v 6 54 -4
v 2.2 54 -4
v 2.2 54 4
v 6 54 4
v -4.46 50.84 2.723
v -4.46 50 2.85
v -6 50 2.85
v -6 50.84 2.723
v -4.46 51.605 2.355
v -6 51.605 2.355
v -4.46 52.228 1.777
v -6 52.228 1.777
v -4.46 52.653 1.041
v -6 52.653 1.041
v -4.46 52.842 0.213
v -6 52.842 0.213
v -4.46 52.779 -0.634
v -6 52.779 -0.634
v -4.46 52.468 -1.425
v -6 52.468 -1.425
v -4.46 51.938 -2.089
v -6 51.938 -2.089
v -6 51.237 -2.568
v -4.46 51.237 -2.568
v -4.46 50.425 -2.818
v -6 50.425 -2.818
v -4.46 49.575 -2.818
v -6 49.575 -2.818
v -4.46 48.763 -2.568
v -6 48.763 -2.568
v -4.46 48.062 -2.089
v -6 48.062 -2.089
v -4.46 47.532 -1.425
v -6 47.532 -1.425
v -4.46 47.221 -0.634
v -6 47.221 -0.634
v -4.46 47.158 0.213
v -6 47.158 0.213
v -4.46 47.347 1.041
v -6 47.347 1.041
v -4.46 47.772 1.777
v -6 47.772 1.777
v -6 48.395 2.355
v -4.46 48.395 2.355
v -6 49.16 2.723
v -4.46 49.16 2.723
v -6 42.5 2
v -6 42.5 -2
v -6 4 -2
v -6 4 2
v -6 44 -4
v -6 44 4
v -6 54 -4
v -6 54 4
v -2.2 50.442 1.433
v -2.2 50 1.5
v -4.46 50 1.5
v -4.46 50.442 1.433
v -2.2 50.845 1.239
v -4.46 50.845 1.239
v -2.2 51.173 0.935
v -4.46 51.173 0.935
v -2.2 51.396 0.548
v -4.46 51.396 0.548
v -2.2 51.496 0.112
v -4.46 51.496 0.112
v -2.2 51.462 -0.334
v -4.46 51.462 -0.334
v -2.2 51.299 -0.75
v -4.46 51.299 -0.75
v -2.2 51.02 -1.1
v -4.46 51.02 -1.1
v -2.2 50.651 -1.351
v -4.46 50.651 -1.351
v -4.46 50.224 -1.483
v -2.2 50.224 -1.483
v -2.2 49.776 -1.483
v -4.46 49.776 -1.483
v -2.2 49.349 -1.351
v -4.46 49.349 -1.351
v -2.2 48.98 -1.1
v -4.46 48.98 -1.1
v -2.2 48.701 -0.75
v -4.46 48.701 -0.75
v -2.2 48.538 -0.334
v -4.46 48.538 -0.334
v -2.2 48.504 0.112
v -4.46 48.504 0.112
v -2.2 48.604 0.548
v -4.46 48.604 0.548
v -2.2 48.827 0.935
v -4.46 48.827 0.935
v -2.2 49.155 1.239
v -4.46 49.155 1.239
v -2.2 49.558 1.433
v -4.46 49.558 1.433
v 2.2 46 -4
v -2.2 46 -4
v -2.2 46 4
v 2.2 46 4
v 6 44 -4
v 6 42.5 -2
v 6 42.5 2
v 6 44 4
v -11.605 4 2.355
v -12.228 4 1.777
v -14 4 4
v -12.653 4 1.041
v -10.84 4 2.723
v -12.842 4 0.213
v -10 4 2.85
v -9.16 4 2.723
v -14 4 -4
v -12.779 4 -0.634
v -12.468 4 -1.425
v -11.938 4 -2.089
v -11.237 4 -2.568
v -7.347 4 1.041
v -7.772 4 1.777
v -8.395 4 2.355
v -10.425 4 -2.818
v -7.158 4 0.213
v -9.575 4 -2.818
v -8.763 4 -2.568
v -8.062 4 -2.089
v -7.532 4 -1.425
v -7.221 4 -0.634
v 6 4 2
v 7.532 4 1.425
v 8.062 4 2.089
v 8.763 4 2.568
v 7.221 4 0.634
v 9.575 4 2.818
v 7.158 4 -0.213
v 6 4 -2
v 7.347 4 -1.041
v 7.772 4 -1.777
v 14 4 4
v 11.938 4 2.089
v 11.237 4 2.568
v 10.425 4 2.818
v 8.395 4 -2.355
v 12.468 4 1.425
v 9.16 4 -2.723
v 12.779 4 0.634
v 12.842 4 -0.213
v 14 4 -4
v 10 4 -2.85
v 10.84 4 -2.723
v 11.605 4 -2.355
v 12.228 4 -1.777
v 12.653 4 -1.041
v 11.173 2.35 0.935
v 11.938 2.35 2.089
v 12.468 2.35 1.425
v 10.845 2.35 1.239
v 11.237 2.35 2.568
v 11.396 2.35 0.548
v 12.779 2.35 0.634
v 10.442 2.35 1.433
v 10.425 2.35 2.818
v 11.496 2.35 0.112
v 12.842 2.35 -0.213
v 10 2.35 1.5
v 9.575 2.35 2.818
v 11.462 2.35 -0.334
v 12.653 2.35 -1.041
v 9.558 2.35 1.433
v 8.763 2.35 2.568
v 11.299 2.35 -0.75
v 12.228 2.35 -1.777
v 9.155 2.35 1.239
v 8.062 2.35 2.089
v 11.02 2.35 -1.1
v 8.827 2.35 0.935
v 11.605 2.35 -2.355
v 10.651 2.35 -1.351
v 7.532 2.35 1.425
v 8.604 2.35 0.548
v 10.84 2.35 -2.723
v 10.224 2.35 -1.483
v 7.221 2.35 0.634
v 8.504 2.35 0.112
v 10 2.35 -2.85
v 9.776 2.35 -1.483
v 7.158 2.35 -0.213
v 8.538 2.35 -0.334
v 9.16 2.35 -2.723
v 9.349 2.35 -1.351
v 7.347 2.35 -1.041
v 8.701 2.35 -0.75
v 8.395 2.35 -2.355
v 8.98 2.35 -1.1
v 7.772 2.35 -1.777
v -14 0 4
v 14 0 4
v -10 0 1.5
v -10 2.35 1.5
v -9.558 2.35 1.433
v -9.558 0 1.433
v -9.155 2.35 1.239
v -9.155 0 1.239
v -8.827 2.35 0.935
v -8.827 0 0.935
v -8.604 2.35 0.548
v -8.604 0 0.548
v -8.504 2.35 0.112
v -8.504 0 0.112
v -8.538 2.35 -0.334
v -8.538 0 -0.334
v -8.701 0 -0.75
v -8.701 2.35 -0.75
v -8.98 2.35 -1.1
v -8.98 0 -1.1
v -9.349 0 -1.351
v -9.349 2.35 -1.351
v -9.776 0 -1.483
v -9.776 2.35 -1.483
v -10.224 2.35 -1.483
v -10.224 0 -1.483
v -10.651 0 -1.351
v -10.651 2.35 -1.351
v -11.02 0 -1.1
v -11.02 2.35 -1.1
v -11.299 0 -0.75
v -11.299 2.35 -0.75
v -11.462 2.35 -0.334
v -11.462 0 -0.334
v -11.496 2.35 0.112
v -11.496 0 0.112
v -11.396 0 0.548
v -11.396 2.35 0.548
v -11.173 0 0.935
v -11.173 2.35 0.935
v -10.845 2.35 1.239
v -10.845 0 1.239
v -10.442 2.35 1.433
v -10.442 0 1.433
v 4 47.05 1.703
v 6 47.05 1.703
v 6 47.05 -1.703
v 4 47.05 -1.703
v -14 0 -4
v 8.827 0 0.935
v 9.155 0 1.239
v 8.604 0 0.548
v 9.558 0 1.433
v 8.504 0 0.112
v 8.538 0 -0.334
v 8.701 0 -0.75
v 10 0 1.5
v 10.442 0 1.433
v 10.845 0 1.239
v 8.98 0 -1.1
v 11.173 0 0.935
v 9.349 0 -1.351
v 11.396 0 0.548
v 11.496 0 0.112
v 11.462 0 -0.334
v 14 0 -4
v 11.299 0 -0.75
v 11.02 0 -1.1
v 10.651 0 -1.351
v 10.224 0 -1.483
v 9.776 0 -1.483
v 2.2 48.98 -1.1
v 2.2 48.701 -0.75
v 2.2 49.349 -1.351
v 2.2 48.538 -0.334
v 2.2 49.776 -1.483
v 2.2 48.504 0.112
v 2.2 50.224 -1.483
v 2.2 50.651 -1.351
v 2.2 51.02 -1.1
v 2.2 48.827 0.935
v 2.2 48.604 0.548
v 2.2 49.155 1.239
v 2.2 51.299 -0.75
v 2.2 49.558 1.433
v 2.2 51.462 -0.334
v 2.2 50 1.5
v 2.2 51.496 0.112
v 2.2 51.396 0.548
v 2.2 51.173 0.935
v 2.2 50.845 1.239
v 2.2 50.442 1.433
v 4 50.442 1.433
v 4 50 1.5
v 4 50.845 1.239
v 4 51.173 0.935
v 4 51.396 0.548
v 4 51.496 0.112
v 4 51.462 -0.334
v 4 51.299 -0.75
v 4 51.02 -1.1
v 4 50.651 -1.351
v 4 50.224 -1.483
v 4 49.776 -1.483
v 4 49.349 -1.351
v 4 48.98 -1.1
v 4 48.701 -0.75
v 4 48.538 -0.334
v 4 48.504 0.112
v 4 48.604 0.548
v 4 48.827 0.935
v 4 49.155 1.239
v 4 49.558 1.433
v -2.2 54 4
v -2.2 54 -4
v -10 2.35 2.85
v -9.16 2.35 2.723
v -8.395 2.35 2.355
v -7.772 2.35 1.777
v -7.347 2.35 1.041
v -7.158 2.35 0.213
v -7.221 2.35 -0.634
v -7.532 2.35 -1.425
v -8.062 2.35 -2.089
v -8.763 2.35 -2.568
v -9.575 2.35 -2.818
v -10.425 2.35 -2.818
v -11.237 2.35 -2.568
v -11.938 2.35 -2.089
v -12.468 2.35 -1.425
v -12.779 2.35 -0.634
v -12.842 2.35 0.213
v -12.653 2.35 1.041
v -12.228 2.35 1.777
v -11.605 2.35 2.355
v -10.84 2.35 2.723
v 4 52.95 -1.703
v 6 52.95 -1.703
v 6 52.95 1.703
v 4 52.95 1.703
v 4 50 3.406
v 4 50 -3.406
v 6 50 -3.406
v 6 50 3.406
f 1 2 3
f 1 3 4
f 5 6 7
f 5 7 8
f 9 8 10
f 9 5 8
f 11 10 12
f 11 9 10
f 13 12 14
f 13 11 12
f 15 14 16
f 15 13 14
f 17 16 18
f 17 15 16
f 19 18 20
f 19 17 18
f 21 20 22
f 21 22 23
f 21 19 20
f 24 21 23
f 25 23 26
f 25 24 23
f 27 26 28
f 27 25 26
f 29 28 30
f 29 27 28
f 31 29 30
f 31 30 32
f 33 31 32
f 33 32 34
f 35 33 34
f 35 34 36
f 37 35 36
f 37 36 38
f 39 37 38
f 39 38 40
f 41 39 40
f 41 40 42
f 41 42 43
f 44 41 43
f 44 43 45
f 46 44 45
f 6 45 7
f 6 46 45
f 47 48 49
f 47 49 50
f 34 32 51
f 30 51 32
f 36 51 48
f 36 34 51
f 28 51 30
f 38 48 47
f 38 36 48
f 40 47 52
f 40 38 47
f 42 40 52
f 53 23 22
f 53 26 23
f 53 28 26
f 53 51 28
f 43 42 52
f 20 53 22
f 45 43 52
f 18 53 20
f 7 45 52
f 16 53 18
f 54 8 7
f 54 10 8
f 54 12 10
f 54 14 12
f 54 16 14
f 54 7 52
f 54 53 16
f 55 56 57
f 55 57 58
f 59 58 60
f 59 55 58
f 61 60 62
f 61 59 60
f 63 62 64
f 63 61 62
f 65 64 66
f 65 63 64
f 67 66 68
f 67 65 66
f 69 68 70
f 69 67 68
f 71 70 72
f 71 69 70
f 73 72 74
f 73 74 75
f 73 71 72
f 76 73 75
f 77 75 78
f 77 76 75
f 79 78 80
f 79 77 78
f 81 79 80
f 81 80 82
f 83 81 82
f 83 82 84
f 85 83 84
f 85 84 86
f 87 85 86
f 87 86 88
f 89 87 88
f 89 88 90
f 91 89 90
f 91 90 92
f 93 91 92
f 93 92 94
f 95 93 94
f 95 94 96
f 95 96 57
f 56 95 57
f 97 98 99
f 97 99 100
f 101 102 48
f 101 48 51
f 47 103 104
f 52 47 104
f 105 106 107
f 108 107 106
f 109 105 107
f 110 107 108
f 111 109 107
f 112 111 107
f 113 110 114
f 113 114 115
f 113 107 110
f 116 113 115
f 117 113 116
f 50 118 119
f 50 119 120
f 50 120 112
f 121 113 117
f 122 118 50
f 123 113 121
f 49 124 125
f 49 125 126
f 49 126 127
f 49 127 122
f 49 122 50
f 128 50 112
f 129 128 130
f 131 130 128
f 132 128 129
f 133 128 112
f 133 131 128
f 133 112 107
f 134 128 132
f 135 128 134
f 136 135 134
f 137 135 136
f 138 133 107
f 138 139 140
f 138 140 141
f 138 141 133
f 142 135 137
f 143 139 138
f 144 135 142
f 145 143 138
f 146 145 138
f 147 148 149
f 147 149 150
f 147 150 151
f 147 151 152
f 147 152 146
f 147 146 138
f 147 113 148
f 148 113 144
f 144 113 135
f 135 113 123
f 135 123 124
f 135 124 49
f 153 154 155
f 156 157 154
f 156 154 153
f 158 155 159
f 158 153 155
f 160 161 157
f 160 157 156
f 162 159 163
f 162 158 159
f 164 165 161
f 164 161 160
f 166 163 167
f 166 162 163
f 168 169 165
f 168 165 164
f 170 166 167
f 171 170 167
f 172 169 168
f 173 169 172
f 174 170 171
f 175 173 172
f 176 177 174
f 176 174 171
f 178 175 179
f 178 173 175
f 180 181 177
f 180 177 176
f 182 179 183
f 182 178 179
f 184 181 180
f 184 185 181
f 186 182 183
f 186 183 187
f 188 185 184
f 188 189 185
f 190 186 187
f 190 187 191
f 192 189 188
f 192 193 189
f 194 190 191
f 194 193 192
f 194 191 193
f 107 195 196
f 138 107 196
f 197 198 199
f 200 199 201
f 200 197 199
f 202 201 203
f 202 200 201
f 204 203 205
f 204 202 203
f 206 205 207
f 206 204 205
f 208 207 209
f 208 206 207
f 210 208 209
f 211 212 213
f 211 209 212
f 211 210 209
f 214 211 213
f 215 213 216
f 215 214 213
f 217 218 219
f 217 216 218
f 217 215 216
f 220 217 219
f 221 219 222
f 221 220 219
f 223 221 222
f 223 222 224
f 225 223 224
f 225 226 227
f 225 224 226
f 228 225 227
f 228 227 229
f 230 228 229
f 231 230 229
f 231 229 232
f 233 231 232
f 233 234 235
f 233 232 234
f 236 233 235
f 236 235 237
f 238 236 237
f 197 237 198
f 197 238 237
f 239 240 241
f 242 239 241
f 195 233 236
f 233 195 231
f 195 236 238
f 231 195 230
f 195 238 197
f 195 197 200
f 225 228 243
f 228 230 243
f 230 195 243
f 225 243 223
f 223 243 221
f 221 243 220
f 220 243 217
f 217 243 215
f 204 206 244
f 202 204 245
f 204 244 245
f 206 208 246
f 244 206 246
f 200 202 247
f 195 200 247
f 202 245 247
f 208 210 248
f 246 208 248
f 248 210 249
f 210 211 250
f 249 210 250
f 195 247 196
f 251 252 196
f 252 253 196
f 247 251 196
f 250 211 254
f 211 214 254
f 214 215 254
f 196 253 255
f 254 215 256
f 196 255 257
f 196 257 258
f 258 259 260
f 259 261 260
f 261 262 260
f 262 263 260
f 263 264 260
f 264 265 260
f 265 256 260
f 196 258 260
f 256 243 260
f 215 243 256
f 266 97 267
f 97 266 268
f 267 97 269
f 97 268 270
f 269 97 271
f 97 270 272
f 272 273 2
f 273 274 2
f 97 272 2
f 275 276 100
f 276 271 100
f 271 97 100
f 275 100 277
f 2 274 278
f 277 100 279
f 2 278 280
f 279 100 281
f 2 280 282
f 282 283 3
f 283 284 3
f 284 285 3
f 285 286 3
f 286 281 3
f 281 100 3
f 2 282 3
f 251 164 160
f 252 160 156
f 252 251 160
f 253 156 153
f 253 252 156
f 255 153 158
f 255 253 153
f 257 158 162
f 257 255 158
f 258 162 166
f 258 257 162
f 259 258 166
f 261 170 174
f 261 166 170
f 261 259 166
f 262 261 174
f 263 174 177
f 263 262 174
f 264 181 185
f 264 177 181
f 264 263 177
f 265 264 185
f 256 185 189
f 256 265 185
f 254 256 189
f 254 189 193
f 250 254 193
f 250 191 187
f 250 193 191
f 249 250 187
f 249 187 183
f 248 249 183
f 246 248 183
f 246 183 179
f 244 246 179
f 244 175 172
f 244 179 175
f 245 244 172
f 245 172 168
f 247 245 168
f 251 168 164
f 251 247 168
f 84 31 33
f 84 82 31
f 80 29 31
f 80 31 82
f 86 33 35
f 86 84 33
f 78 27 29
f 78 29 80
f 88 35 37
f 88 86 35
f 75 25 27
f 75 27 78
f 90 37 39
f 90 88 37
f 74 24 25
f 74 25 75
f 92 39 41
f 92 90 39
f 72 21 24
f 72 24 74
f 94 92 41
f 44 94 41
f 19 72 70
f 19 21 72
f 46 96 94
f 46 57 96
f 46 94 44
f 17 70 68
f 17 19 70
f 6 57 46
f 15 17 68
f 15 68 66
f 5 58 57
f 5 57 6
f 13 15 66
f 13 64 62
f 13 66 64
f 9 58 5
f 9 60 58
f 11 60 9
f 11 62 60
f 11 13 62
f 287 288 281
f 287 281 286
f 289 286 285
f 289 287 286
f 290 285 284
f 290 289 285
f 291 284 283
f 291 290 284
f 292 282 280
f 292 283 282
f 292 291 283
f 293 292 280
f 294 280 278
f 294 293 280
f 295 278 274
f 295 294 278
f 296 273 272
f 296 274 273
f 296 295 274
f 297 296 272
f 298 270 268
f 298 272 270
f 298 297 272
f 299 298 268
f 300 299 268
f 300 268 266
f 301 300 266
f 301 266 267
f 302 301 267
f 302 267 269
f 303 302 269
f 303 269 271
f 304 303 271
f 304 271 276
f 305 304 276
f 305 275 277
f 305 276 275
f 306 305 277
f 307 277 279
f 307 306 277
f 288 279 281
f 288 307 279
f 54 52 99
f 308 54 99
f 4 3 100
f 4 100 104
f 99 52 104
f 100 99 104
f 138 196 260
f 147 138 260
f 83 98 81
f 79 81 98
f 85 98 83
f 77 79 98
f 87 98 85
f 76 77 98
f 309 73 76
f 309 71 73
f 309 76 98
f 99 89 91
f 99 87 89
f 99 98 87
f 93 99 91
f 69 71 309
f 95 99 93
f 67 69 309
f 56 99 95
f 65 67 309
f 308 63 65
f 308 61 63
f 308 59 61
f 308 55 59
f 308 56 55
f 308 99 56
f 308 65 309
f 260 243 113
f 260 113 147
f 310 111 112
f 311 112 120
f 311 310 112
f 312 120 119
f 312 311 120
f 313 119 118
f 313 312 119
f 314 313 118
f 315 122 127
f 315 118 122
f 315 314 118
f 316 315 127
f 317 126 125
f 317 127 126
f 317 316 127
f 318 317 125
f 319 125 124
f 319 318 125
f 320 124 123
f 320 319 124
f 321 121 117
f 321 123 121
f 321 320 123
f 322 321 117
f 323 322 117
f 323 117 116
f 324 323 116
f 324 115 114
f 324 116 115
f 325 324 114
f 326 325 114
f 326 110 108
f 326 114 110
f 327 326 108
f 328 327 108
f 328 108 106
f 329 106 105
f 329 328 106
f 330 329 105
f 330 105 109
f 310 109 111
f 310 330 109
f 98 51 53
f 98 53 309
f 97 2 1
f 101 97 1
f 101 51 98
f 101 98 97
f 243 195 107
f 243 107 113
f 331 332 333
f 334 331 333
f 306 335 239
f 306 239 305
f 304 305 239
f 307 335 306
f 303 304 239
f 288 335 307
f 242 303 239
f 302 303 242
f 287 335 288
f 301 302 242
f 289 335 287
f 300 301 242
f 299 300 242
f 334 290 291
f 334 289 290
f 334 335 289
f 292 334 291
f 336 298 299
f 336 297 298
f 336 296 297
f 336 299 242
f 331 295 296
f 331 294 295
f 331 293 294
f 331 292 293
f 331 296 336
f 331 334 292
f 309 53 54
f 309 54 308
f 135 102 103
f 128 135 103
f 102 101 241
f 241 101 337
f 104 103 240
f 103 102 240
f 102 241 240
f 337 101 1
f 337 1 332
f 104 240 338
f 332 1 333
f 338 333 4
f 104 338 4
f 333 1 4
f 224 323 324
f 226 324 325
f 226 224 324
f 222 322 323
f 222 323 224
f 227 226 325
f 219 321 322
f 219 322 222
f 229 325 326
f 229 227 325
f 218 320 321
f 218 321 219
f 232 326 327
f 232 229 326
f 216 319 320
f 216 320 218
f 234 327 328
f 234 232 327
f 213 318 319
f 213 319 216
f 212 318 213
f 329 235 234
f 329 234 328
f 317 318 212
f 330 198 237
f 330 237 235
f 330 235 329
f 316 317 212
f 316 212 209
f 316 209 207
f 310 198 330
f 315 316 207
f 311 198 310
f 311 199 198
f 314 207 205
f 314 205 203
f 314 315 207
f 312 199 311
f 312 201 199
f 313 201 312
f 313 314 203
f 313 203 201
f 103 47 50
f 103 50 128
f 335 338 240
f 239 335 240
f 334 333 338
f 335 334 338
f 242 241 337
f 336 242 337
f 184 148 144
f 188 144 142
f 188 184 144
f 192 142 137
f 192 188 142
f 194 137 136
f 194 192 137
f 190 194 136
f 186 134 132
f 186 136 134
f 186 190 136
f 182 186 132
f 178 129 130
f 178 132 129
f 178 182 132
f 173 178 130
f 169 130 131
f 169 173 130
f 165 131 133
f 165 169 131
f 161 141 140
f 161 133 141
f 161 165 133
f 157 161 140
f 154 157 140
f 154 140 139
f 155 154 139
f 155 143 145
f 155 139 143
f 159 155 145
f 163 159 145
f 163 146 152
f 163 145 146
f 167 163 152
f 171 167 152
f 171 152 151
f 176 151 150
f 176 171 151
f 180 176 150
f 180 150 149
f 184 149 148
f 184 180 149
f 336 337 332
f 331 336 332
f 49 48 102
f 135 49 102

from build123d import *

# Parameters (mm, degrees)
CROQUIS1_W              = 28
CROQUIS1_H              = 8
CROQUIS1_R              = 2.85
CROQUIS1_R_2            = 1.5
SALIENTE_EXTRUIR1_DEPTH = 4
CORTAR_EXTRUIR1_START   = 2.35
CROQUIS1_3_R            = 2.85
CORTAR_EXTRUIR1_DEPTH   = 13.749668871
CROQUIS2_W              = 12
CROQUIS2_H              = 4
SALIENTE_EXTRUIR2_DEPTH = 40
CROQUIS3_W              = 12
CROQUIS3_H              = 8
SALIENTE_EXTRUIR3_DEPTH = 10
CROQUIS4_W              = 4.4
CROQUIS4_H              = 8
CORTAR_EXTRUIR2_DEPTH   = 57.356011214
CORTAR_EXTRUIR7_START   = -12
CROQUIS5_R              = 1.5
CORTAR_EXTRUIR7_DEPTH   = 12
CORTAR_EXTRUIR8_START   = -1.54
CROQUIS5_4_R            = 2.85
CROQUIS5_4_R_2          = 1.5
CORTAR_EXTRUIR8_DEPTH   = 1.54
CORTAR_EXTRUIR9_DEPTH   = 2
SALIENTE_EXTRUIR4_DEPTH = 12


with BuildPart() as part:
    # Croquis1 → Saliente-Extruir1 (new body)
    # profile 1 of 3: a face of its own
    with BuildSketch(Plane(origin=(0, 0, 0), x_dir=(1, 0, 0), z_dir=(0, 1, 0))):
        Rectangle(CROQUIS1_W, CROQUIS1_H)
        with Locations((-10, 0)):
            Circle(CROQUIS1_R, mode=Mode.SUBTRACT)
        with Locations((10, 0)):
            Circle(CROQUIS1_R, mode=Mode.SUBTRACT)
    # profile 2 of 3: a face of its own
    with BuildSketch(Plane(origin=(0, 0, 0), x_dir=(1, 0, 0), z_dir=(0, 1, 0))):
        with Locations((-10, 0)):
            Circle(CROQUIS1_R)
        with Locations(Location((-10, 0, 0), (0, 0, 270))):
            Circle(CROQUIS1_R_2, mode=Mode.SUBTRACT)
    # profile 3 of 3: a face of its own
    with BuildSketch(Plane(origin=(0, 0, 0), x_dir=(1, 0, 0), z_dir=(0, 1, 0))):
        with Locations((10, 0)):
            Circle(CROQUIS1_R)
        with Locations(Location((10, 0, 0), (0, 0, 270))):
            Circle(CROQUIS1_R_2, mode=Mode.SUBTRACT)
    extrude(amount=SALIENTE_EXTRUIR1_DEPTH)

    # Croquis1<3> → Cortar-Extruir1 (cut, through all)
    with BuildSketch(Plane(origin=(0, 0, 0), x_dir=(1, 0, 0), z_dir=(0, 1, 0)).offset(CORTAR_EXTRUIR1_START)):
        with Locations(Location((-10, 0, 0), (0, 0, 270))):
            Circle(CROQUIS1_3_R)
        with Locations(Location((10, 0, 0), (0, 0, 90))):
            Circle(CROQUIS1_3_R)
    extrude(amount=CORTAR_EXTRUIR1_DEPTH, mode=Mode.SUBTRACT)

    # Croquis2 → Saliente-Extruir2 (add)
    with BuildSketch(Plane(origin=(0, 4, 0), x_dir=(1, 0, 0), z_dir=(0, 1, 0))):
        Rectangle(CROQUIS2_W, CROQUIS2_H)
    extrude(amount=SALIENTE_EXTRUIR2_DEPTH)

    # Croquis3 → Saliente-Extruir3 (add)
    with BuildSketch(Plane(origin=(0, 44, 0), x_dir=(1, 0, 0), z_dir=(0, 1, 0))):
        Rectangle(CROQUIS3_W, CROQUIS3_H)
    extrude(amount=SALIENTE_EXTRUIR3_DEPTH)

    # Croquis4 → Cortar-Extruir2 (cut, through all)
    with BuildSketch(Plane.XY.offset(4)):
        with Locations((0, 50)):
            Rectangle(CROQUIS4_W, CROQUIS4_H)
    extrude(amount=-CORTAR_EXTRUIR2_DEPTH, mode=Mode.SUBTRACT)

    # Croquis5 → Cortar-Extruir7 (cut)
    with BuildSketch(Plane.ZY.offset(6).offset(CORTAR_EXTRUIR7_START)):
        with Locations((0, 50)):
            Circle(CROQUIS5_R)
    extrude(amount=CORTAR_EXTRUIR7_DEPTH, mode=Mode.SUBTRACT)

    # Croquis5<4> → Cortar-Extruir8 (cut)
    with BuildSketch(Plane.ZY.offset(6).offset(CORTAR_EXTRUIR8_START)):
        with Locations((0, 50)):
            Circle(CROQUIS5_4_R)
        with Locations((0, 50)):
            Circle(CROQUIS5_4_R_2, mode=Mode.SUBTRACT)
    extrude(amount=CORTAR_EXTRUIR8_DEPTH, mode=Mode.SUBTRACT)

    # Croquis7 → Cortar-Extruir9 (cut)
    with BuildSketch(Plane(origin=(6, 0, 0), x_dir=(0, 0, -1), z_dir=(1, 0, 0))):
        Polygon((-3.406366588, 50), (-1.703183294, 47.05), (1.703183294, 47.05), (3.406366588, 50), (1.703183294, 52.95), (-1.703183294, 52.95), align=None)
    extrude(amount=-CORTAR_EXTRUIR9_DEPTH, mode=Mode.SUBTRACT)

    # Croquis8 → Saliente-Extruir4 (add)
    with BuildSketch(Plane(origin=(6, 0, 0), x_dir=(0, 0, -1), z_dir=(1, 0, 0))):
        Polygon((-4, 44), (-2, 44), (-2, 42.5), align=None)
        Polygon((2, 42.5), (4, 44), (2, 44), align=None)
    extrude(amount=-SALIENTE_EXTRUIR4_DEPTH)


solid = part.part
